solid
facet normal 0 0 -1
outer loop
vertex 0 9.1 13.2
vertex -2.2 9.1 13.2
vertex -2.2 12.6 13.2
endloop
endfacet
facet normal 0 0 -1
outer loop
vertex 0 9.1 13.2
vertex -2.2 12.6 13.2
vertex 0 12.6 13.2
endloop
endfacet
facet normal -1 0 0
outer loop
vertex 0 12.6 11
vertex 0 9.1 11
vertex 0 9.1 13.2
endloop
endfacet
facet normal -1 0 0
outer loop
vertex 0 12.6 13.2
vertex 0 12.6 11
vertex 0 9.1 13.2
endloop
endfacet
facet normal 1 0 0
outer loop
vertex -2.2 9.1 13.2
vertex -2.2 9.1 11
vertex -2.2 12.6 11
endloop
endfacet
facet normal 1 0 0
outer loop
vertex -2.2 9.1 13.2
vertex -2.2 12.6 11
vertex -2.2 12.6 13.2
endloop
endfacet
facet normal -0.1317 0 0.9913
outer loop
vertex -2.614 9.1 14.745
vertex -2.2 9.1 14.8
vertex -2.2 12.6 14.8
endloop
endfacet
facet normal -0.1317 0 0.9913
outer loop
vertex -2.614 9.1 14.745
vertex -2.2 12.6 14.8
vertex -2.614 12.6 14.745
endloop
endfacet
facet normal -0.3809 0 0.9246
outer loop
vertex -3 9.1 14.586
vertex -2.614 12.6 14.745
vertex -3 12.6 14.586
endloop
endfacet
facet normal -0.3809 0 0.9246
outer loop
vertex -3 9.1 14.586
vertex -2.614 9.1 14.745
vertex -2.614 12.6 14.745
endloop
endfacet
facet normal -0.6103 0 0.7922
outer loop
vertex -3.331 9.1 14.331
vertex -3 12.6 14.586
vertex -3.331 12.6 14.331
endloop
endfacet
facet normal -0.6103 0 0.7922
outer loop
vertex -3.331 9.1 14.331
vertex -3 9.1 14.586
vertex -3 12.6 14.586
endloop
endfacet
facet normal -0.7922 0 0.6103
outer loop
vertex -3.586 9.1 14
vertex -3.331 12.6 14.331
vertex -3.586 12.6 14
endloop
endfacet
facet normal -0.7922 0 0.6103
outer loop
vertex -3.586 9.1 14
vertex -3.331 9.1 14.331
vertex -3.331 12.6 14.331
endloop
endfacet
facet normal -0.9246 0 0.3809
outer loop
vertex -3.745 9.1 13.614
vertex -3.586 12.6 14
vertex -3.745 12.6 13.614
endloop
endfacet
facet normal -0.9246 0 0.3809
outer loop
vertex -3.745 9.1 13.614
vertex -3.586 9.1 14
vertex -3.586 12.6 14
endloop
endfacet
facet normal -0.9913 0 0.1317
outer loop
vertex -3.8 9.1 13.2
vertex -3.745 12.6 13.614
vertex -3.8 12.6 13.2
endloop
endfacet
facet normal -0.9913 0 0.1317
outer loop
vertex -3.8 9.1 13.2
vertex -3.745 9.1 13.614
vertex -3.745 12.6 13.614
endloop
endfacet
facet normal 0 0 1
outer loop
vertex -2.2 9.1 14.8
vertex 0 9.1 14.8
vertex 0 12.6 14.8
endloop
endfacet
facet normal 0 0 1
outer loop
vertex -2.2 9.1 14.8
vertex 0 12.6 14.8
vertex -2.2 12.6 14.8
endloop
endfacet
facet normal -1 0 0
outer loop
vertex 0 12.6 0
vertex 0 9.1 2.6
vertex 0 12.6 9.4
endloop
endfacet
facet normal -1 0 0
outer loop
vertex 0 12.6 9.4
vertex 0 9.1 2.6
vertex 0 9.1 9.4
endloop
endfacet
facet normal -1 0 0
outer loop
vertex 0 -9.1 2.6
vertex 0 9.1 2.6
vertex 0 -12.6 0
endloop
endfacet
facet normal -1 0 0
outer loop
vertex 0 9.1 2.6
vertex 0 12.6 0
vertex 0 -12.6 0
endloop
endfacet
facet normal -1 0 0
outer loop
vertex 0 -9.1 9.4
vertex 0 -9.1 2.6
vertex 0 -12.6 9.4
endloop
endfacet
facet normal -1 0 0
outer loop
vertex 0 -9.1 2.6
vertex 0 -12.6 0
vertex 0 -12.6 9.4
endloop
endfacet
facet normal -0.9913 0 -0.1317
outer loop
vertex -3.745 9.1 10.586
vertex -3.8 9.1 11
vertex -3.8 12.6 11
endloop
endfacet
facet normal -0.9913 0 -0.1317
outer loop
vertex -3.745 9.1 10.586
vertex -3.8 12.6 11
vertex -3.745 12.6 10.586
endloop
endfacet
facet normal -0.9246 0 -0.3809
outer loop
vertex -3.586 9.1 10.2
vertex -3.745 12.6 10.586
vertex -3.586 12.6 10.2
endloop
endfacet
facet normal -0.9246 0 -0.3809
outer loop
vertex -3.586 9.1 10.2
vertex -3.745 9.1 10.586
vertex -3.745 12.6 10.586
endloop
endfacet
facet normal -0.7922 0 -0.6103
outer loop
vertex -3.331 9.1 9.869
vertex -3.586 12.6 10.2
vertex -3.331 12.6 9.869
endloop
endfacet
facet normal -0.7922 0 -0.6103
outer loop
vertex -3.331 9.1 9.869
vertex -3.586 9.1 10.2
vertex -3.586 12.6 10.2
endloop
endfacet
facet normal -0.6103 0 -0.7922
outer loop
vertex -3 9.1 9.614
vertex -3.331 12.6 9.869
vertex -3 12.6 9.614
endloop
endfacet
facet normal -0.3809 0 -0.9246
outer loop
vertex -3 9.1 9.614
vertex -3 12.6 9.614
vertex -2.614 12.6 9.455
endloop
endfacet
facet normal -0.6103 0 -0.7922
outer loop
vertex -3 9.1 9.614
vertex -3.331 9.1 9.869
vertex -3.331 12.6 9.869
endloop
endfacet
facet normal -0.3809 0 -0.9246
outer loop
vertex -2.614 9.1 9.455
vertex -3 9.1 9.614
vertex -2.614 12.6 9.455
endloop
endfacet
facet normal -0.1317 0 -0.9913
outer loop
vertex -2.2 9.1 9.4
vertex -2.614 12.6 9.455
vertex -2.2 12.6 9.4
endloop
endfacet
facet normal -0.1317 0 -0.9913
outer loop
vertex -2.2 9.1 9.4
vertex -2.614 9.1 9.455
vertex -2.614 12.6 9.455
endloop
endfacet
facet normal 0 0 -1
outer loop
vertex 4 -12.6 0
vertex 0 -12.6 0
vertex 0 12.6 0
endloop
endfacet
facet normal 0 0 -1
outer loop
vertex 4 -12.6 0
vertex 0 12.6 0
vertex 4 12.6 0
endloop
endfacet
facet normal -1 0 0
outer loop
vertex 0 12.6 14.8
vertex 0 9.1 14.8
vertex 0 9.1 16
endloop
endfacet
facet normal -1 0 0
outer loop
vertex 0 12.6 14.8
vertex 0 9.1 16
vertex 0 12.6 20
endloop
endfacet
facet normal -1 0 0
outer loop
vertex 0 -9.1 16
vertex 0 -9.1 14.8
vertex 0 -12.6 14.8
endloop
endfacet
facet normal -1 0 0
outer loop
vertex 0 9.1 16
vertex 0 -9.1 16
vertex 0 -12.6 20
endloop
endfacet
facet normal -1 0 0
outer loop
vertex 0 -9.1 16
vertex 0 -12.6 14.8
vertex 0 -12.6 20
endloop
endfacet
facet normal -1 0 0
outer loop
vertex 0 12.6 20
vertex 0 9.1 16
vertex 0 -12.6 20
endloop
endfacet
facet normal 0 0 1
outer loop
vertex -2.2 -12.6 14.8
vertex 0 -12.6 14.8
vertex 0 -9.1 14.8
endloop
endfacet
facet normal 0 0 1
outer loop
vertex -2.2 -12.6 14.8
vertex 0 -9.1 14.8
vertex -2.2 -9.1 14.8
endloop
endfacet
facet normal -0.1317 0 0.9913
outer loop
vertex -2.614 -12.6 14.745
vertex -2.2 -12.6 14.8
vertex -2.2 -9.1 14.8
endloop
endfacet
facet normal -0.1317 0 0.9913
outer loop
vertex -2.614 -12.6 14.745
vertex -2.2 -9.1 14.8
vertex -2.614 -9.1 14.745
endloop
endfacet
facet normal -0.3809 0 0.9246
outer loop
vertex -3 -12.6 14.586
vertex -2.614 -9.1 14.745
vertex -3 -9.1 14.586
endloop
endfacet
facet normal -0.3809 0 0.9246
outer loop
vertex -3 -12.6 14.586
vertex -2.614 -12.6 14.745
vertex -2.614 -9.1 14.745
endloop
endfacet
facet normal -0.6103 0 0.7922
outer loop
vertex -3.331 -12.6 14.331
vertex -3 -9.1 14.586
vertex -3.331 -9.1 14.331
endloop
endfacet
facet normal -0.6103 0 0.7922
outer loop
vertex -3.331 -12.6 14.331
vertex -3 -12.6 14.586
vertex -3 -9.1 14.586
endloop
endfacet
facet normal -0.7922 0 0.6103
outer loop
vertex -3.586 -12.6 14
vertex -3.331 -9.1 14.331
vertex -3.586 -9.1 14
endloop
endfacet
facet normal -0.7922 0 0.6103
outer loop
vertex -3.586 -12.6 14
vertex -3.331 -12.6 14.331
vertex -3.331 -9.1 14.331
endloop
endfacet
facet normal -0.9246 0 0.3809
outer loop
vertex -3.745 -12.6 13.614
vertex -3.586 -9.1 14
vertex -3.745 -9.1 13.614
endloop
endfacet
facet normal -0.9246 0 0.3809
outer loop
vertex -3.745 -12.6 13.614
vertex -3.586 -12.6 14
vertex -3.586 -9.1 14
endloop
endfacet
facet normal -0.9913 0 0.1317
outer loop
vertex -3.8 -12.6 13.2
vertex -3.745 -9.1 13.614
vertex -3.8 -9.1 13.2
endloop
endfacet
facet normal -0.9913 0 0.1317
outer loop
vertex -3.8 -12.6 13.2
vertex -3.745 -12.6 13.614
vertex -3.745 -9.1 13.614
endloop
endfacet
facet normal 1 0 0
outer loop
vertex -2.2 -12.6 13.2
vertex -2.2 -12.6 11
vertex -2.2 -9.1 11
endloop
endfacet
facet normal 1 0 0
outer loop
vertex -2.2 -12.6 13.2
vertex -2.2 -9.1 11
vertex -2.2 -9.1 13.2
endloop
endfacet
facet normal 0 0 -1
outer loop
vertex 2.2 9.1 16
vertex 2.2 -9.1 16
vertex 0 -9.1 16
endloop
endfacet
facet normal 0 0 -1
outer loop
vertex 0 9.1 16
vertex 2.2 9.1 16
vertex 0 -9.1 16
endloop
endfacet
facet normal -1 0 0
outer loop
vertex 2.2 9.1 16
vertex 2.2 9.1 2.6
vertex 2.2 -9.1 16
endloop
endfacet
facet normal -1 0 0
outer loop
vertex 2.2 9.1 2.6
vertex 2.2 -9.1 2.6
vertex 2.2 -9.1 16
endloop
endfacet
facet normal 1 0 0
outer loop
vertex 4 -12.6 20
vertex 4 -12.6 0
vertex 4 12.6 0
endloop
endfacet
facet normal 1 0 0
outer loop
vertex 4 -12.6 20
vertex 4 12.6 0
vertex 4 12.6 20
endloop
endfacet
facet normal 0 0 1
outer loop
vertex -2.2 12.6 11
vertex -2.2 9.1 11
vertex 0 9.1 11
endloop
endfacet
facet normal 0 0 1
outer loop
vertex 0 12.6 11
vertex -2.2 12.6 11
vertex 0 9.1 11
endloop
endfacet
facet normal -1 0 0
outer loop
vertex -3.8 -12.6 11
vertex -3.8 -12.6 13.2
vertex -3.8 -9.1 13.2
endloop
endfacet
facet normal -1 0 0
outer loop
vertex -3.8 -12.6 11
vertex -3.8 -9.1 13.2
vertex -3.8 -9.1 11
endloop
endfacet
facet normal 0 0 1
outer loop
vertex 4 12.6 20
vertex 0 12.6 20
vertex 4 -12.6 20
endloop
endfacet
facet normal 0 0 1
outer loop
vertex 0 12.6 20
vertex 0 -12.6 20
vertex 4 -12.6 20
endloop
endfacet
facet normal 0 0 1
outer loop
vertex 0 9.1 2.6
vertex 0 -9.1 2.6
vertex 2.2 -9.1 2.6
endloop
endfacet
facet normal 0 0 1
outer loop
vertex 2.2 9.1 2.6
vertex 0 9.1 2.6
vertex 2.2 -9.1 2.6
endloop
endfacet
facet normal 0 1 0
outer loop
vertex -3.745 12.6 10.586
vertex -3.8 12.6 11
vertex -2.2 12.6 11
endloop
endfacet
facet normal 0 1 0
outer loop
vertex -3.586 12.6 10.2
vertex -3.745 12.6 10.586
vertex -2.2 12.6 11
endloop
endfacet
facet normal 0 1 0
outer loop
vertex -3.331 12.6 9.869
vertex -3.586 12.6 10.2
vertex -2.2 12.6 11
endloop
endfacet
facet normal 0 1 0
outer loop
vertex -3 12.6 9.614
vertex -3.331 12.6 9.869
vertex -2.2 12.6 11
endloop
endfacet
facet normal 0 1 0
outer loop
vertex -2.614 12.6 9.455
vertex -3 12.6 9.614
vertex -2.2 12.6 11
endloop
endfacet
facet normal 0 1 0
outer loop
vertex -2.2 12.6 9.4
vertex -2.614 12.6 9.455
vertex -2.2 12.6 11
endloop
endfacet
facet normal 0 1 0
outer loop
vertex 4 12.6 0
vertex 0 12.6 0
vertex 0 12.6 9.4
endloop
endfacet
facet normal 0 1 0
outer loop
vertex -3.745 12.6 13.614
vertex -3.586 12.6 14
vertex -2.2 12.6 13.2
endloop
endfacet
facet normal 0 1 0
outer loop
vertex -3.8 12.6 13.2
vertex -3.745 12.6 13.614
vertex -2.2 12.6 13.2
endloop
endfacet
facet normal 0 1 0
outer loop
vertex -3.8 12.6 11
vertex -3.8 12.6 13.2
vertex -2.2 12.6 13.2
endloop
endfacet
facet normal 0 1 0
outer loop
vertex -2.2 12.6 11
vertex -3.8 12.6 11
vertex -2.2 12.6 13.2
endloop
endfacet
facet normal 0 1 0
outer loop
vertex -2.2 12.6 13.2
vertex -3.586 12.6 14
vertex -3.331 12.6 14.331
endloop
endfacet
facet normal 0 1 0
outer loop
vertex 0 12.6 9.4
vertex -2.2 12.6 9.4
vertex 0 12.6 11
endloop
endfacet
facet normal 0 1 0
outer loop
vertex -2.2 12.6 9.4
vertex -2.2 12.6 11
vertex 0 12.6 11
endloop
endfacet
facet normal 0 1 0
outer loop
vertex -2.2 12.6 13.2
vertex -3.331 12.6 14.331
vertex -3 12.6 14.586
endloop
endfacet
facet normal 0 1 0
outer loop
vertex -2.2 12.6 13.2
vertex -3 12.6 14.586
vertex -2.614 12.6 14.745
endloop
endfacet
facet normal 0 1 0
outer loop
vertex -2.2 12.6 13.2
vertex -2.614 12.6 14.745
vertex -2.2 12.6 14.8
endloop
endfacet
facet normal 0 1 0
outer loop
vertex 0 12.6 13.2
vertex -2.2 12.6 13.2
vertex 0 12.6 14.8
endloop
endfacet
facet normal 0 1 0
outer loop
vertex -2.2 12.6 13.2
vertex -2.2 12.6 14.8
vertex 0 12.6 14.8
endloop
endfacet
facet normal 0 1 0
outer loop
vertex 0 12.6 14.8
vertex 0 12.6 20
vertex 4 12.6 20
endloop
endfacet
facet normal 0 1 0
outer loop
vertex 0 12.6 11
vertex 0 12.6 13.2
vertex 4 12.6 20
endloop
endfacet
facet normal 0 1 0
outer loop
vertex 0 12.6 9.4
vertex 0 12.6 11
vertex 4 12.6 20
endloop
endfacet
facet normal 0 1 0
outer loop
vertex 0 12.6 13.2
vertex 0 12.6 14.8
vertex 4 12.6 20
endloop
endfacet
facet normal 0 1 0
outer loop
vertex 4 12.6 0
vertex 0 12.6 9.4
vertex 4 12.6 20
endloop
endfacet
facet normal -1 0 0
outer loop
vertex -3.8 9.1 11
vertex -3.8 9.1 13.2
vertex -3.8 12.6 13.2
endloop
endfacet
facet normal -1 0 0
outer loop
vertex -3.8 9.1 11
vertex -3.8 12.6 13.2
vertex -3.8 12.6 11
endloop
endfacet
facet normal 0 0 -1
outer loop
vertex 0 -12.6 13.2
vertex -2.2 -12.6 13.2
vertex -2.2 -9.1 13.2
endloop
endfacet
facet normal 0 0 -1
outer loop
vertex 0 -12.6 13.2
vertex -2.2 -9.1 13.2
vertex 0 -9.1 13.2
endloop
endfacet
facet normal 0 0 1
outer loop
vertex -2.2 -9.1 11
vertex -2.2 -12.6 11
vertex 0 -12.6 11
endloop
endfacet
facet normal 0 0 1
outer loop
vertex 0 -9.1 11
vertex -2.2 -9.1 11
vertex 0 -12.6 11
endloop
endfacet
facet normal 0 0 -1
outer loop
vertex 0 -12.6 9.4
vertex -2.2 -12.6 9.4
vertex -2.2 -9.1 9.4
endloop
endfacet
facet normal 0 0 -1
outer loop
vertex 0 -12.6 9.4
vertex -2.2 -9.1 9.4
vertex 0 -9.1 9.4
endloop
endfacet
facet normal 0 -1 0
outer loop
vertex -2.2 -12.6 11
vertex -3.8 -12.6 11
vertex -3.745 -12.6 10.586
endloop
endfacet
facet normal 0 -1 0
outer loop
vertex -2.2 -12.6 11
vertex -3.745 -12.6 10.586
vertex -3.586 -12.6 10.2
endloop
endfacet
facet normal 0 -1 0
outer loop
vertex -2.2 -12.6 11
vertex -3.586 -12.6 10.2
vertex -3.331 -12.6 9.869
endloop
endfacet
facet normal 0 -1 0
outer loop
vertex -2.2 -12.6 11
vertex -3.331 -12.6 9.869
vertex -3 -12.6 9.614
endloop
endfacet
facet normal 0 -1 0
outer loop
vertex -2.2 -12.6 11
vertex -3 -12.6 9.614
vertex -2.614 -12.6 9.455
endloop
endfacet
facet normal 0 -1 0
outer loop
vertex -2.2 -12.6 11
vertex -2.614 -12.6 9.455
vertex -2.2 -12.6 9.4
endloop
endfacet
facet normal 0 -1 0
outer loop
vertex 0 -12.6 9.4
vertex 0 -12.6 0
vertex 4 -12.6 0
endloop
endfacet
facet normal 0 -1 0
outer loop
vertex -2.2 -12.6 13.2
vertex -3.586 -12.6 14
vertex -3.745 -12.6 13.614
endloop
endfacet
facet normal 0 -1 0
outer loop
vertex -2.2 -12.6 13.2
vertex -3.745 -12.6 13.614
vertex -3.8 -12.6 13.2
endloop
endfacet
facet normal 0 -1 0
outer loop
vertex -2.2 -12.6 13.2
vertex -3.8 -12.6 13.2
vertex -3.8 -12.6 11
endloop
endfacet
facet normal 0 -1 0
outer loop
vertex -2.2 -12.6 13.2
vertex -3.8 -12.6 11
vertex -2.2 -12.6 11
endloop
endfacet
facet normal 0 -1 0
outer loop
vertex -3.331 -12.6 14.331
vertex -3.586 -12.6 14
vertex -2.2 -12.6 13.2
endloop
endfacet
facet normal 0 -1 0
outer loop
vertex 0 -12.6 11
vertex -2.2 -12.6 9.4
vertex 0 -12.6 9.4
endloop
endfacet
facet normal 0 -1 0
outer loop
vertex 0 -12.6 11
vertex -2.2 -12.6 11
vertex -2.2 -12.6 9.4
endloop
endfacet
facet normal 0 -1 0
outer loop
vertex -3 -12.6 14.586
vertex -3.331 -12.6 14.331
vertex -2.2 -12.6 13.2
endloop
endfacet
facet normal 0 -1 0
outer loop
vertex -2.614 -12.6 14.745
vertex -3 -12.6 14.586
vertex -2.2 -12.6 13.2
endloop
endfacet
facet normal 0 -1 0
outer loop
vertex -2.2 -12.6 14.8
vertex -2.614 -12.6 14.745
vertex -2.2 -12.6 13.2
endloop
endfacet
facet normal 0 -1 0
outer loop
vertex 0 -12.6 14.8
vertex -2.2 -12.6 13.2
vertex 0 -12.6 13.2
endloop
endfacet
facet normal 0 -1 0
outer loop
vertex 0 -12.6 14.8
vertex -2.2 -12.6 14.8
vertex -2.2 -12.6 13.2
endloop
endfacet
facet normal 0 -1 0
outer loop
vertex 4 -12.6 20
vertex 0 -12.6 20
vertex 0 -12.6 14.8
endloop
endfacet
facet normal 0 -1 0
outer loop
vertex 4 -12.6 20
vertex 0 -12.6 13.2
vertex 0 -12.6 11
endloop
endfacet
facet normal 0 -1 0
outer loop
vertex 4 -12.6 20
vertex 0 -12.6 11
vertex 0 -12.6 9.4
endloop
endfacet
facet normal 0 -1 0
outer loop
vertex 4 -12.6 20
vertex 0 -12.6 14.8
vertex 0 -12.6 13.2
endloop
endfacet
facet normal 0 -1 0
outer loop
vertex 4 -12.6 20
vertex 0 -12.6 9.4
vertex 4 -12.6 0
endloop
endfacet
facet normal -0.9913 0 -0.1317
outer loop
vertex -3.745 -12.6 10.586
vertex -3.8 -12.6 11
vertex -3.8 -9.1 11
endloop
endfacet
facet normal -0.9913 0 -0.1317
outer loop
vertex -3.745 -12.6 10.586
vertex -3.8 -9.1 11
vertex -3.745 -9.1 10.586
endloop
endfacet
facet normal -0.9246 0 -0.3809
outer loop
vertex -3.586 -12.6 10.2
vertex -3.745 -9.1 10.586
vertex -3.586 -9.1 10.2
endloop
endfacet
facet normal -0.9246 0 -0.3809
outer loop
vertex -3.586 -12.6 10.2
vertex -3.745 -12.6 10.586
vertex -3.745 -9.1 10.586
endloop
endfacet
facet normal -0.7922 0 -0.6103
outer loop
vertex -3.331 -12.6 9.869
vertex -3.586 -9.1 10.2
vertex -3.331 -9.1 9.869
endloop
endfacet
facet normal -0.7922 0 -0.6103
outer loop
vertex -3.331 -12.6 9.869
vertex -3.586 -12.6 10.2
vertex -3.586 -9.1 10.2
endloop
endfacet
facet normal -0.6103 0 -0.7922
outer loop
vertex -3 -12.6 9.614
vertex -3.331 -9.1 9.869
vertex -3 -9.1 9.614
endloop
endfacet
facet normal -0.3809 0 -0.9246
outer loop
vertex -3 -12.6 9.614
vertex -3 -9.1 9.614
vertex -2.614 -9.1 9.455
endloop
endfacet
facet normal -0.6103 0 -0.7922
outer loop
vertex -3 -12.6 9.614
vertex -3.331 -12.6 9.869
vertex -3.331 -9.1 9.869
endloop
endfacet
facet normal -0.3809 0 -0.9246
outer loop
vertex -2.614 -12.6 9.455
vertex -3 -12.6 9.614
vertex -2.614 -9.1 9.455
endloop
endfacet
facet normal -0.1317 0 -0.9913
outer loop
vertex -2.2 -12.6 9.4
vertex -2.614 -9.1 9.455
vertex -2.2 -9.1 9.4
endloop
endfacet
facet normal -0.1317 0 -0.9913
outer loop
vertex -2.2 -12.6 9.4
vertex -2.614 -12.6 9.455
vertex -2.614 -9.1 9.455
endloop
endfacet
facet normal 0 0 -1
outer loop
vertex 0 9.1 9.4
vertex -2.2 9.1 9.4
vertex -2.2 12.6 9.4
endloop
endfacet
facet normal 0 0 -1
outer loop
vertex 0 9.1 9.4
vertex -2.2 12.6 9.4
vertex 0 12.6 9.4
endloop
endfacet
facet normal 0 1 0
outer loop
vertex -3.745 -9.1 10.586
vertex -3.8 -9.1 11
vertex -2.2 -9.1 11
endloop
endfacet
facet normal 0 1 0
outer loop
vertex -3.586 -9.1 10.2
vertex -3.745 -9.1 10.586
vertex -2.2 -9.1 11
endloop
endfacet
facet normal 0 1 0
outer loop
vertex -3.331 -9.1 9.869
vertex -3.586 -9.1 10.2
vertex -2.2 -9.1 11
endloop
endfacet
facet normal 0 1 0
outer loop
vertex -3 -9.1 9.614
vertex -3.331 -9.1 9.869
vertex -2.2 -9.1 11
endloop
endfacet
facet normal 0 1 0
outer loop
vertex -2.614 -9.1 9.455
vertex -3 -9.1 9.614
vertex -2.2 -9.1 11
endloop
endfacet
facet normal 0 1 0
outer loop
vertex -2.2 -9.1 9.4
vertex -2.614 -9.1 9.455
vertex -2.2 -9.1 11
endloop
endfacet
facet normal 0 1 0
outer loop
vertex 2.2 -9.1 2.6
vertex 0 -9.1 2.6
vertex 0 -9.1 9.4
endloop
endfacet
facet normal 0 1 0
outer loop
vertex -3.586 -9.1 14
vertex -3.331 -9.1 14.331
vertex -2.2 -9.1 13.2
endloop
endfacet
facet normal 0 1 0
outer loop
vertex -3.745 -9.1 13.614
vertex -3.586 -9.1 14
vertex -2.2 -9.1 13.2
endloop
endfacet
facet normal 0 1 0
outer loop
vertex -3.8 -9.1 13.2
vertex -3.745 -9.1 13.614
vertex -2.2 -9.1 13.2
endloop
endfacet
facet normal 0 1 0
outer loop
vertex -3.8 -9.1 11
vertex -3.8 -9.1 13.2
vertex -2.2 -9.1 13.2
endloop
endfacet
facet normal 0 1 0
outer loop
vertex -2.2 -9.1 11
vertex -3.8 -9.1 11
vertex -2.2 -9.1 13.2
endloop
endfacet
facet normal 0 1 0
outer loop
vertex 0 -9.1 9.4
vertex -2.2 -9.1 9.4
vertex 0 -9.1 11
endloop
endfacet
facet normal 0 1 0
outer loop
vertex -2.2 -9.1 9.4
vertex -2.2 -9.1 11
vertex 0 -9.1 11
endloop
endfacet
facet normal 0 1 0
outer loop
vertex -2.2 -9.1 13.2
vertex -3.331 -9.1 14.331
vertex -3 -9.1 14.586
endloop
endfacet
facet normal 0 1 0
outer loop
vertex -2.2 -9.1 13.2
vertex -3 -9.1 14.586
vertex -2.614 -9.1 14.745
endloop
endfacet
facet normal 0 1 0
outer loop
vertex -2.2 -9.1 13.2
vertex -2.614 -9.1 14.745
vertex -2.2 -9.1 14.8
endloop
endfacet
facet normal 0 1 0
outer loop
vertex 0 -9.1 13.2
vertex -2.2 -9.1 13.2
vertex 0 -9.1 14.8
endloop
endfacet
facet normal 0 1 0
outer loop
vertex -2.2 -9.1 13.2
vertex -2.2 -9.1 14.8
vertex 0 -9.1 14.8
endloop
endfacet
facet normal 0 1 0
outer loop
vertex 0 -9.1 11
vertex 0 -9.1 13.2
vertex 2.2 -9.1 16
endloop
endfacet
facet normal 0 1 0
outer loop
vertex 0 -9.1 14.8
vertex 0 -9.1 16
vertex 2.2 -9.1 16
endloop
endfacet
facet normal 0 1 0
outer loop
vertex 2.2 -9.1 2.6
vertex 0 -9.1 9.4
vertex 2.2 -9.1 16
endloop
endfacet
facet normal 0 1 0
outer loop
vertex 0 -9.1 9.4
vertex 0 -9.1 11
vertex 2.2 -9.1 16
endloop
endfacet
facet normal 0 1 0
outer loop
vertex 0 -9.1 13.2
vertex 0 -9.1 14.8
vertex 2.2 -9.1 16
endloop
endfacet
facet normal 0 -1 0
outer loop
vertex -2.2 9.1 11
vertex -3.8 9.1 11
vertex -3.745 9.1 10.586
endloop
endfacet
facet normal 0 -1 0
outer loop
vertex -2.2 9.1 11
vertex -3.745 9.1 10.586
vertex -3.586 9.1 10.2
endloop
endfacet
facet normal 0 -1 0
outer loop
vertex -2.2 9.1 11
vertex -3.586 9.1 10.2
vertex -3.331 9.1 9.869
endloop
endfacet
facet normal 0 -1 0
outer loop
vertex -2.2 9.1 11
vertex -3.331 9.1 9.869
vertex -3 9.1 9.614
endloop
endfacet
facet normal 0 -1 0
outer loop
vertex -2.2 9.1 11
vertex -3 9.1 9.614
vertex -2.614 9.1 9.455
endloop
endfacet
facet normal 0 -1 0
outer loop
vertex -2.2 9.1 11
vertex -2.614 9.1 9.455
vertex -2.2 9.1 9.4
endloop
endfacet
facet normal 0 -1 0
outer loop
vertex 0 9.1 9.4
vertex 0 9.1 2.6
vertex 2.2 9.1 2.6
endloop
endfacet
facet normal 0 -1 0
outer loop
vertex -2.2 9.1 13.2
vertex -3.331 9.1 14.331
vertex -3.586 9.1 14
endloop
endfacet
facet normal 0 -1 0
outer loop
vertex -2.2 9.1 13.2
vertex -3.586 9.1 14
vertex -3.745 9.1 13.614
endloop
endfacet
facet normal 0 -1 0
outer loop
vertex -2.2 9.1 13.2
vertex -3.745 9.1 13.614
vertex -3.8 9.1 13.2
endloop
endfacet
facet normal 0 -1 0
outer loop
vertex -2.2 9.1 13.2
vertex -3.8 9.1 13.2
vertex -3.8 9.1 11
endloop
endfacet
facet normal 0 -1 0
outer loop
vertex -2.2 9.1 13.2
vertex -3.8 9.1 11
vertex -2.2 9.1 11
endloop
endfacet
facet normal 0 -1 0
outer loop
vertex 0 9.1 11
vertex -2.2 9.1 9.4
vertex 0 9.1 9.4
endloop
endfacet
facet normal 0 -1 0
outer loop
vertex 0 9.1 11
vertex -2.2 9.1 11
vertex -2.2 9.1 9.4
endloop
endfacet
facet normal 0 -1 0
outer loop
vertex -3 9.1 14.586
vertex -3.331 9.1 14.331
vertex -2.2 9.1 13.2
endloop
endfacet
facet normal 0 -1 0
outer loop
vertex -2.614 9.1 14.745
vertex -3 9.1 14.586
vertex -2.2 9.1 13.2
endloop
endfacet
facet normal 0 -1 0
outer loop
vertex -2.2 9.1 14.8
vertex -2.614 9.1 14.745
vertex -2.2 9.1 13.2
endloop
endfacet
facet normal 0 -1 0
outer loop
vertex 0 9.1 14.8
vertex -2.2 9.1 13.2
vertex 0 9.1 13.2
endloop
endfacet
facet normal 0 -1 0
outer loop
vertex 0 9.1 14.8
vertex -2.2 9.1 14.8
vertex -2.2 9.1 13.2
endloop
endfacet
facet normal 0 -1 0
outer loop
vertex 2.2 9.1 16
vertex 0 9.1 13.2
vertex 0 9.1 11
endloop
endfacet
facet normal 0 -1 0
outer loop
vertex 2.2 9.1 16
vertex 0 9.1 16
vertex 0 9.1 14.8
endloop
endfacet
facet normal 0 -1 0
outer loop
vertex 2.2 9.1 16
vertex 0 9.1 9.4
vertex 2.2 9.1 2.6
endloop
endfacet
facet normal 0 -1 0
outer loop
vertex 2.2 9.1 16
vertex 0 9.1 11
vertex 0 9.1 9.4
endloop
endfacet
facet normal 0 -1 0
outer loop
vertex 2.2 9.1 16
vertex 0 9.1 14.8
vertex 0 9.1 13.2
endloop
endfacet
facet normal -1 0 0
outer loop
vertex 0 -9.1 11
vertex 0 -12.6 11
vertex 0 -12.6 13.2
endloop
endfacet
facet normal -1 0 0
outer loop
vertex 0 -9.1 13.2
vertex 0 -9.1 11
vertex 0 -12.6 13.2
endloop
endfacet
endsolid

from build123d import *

# Parameters (mm, degrees)
EXTRUDE002_DEPTH = 9.1
SKETCH006_W      = 2.2
SKETCH006_H      = 2.2
EXTRUDE006_DEPTH = 12.6
SKETCH_W         = 4
SKETCH_H         = 20
EXTRUDE_DEPTH    = 12.6


with BuildPart() as extrude002_step_down:
    # Sketch002 → Extrude002 (new body, symmetric)
    with BuildSketch(Plane.XZ):
        Polygon((0, 2.6), (2.2, 2.6), (2.2, 16), (0, 16), (-3.8, 16), (-3.8, 2.6), align=None)
    extrude(amount=EXTRUDE002_DEPTH, both=True)


with BuildPart() as extrude006_fermo_step_down:
    # Sketch006 → Extrude006 (new body, symmetric)
    with BuildSketch(Plane.XZ):
        with BuildLine():
            Line((-3.8, 13.2), (-3.8, 11))
            ThreePointArc((-3.8, 11), (-3.331371, 9.868629), (-2.2, 9.4))
            Line((-2.2, 9.4), (1.6, 9.4))
            Line((1.6, 9.4), (1.6, 14.8))
            Line((1.6, 14.8), (-2.2, 14.8))
            ThreePointArc((-2.2, 14.8), (-3.331371, 14.331371), (-3.8, 13.2))
        make_face()
        with Locations((-1.1, 12.1)):
            Rectangle(SKETCH006_W, SKETCH006_H, mode=Mode.SUBTRACT)
    extrude(amount=EXTRUDE006_DEPTH, both=True)


with BuildPart() as cut:
    # Sketch → Extrude (new body, symmetric)
    with BuildSketch(Plane.XZ):
        with Locations((2, 10)):
            Rectangle(SKETCH_W, SKETCH_H)
    extrude(amount=EXTRUDE_DEPTH, both=True)

    # Fusion: union Extrude006 - fermo - step-down
    add(extrude006_fermo_step_down.part)

    # Cut: cut Extrude002 - step -down
    add(extrude002_step_down.part, mode=Mode.SUBTRACT)


solid = cut.part
